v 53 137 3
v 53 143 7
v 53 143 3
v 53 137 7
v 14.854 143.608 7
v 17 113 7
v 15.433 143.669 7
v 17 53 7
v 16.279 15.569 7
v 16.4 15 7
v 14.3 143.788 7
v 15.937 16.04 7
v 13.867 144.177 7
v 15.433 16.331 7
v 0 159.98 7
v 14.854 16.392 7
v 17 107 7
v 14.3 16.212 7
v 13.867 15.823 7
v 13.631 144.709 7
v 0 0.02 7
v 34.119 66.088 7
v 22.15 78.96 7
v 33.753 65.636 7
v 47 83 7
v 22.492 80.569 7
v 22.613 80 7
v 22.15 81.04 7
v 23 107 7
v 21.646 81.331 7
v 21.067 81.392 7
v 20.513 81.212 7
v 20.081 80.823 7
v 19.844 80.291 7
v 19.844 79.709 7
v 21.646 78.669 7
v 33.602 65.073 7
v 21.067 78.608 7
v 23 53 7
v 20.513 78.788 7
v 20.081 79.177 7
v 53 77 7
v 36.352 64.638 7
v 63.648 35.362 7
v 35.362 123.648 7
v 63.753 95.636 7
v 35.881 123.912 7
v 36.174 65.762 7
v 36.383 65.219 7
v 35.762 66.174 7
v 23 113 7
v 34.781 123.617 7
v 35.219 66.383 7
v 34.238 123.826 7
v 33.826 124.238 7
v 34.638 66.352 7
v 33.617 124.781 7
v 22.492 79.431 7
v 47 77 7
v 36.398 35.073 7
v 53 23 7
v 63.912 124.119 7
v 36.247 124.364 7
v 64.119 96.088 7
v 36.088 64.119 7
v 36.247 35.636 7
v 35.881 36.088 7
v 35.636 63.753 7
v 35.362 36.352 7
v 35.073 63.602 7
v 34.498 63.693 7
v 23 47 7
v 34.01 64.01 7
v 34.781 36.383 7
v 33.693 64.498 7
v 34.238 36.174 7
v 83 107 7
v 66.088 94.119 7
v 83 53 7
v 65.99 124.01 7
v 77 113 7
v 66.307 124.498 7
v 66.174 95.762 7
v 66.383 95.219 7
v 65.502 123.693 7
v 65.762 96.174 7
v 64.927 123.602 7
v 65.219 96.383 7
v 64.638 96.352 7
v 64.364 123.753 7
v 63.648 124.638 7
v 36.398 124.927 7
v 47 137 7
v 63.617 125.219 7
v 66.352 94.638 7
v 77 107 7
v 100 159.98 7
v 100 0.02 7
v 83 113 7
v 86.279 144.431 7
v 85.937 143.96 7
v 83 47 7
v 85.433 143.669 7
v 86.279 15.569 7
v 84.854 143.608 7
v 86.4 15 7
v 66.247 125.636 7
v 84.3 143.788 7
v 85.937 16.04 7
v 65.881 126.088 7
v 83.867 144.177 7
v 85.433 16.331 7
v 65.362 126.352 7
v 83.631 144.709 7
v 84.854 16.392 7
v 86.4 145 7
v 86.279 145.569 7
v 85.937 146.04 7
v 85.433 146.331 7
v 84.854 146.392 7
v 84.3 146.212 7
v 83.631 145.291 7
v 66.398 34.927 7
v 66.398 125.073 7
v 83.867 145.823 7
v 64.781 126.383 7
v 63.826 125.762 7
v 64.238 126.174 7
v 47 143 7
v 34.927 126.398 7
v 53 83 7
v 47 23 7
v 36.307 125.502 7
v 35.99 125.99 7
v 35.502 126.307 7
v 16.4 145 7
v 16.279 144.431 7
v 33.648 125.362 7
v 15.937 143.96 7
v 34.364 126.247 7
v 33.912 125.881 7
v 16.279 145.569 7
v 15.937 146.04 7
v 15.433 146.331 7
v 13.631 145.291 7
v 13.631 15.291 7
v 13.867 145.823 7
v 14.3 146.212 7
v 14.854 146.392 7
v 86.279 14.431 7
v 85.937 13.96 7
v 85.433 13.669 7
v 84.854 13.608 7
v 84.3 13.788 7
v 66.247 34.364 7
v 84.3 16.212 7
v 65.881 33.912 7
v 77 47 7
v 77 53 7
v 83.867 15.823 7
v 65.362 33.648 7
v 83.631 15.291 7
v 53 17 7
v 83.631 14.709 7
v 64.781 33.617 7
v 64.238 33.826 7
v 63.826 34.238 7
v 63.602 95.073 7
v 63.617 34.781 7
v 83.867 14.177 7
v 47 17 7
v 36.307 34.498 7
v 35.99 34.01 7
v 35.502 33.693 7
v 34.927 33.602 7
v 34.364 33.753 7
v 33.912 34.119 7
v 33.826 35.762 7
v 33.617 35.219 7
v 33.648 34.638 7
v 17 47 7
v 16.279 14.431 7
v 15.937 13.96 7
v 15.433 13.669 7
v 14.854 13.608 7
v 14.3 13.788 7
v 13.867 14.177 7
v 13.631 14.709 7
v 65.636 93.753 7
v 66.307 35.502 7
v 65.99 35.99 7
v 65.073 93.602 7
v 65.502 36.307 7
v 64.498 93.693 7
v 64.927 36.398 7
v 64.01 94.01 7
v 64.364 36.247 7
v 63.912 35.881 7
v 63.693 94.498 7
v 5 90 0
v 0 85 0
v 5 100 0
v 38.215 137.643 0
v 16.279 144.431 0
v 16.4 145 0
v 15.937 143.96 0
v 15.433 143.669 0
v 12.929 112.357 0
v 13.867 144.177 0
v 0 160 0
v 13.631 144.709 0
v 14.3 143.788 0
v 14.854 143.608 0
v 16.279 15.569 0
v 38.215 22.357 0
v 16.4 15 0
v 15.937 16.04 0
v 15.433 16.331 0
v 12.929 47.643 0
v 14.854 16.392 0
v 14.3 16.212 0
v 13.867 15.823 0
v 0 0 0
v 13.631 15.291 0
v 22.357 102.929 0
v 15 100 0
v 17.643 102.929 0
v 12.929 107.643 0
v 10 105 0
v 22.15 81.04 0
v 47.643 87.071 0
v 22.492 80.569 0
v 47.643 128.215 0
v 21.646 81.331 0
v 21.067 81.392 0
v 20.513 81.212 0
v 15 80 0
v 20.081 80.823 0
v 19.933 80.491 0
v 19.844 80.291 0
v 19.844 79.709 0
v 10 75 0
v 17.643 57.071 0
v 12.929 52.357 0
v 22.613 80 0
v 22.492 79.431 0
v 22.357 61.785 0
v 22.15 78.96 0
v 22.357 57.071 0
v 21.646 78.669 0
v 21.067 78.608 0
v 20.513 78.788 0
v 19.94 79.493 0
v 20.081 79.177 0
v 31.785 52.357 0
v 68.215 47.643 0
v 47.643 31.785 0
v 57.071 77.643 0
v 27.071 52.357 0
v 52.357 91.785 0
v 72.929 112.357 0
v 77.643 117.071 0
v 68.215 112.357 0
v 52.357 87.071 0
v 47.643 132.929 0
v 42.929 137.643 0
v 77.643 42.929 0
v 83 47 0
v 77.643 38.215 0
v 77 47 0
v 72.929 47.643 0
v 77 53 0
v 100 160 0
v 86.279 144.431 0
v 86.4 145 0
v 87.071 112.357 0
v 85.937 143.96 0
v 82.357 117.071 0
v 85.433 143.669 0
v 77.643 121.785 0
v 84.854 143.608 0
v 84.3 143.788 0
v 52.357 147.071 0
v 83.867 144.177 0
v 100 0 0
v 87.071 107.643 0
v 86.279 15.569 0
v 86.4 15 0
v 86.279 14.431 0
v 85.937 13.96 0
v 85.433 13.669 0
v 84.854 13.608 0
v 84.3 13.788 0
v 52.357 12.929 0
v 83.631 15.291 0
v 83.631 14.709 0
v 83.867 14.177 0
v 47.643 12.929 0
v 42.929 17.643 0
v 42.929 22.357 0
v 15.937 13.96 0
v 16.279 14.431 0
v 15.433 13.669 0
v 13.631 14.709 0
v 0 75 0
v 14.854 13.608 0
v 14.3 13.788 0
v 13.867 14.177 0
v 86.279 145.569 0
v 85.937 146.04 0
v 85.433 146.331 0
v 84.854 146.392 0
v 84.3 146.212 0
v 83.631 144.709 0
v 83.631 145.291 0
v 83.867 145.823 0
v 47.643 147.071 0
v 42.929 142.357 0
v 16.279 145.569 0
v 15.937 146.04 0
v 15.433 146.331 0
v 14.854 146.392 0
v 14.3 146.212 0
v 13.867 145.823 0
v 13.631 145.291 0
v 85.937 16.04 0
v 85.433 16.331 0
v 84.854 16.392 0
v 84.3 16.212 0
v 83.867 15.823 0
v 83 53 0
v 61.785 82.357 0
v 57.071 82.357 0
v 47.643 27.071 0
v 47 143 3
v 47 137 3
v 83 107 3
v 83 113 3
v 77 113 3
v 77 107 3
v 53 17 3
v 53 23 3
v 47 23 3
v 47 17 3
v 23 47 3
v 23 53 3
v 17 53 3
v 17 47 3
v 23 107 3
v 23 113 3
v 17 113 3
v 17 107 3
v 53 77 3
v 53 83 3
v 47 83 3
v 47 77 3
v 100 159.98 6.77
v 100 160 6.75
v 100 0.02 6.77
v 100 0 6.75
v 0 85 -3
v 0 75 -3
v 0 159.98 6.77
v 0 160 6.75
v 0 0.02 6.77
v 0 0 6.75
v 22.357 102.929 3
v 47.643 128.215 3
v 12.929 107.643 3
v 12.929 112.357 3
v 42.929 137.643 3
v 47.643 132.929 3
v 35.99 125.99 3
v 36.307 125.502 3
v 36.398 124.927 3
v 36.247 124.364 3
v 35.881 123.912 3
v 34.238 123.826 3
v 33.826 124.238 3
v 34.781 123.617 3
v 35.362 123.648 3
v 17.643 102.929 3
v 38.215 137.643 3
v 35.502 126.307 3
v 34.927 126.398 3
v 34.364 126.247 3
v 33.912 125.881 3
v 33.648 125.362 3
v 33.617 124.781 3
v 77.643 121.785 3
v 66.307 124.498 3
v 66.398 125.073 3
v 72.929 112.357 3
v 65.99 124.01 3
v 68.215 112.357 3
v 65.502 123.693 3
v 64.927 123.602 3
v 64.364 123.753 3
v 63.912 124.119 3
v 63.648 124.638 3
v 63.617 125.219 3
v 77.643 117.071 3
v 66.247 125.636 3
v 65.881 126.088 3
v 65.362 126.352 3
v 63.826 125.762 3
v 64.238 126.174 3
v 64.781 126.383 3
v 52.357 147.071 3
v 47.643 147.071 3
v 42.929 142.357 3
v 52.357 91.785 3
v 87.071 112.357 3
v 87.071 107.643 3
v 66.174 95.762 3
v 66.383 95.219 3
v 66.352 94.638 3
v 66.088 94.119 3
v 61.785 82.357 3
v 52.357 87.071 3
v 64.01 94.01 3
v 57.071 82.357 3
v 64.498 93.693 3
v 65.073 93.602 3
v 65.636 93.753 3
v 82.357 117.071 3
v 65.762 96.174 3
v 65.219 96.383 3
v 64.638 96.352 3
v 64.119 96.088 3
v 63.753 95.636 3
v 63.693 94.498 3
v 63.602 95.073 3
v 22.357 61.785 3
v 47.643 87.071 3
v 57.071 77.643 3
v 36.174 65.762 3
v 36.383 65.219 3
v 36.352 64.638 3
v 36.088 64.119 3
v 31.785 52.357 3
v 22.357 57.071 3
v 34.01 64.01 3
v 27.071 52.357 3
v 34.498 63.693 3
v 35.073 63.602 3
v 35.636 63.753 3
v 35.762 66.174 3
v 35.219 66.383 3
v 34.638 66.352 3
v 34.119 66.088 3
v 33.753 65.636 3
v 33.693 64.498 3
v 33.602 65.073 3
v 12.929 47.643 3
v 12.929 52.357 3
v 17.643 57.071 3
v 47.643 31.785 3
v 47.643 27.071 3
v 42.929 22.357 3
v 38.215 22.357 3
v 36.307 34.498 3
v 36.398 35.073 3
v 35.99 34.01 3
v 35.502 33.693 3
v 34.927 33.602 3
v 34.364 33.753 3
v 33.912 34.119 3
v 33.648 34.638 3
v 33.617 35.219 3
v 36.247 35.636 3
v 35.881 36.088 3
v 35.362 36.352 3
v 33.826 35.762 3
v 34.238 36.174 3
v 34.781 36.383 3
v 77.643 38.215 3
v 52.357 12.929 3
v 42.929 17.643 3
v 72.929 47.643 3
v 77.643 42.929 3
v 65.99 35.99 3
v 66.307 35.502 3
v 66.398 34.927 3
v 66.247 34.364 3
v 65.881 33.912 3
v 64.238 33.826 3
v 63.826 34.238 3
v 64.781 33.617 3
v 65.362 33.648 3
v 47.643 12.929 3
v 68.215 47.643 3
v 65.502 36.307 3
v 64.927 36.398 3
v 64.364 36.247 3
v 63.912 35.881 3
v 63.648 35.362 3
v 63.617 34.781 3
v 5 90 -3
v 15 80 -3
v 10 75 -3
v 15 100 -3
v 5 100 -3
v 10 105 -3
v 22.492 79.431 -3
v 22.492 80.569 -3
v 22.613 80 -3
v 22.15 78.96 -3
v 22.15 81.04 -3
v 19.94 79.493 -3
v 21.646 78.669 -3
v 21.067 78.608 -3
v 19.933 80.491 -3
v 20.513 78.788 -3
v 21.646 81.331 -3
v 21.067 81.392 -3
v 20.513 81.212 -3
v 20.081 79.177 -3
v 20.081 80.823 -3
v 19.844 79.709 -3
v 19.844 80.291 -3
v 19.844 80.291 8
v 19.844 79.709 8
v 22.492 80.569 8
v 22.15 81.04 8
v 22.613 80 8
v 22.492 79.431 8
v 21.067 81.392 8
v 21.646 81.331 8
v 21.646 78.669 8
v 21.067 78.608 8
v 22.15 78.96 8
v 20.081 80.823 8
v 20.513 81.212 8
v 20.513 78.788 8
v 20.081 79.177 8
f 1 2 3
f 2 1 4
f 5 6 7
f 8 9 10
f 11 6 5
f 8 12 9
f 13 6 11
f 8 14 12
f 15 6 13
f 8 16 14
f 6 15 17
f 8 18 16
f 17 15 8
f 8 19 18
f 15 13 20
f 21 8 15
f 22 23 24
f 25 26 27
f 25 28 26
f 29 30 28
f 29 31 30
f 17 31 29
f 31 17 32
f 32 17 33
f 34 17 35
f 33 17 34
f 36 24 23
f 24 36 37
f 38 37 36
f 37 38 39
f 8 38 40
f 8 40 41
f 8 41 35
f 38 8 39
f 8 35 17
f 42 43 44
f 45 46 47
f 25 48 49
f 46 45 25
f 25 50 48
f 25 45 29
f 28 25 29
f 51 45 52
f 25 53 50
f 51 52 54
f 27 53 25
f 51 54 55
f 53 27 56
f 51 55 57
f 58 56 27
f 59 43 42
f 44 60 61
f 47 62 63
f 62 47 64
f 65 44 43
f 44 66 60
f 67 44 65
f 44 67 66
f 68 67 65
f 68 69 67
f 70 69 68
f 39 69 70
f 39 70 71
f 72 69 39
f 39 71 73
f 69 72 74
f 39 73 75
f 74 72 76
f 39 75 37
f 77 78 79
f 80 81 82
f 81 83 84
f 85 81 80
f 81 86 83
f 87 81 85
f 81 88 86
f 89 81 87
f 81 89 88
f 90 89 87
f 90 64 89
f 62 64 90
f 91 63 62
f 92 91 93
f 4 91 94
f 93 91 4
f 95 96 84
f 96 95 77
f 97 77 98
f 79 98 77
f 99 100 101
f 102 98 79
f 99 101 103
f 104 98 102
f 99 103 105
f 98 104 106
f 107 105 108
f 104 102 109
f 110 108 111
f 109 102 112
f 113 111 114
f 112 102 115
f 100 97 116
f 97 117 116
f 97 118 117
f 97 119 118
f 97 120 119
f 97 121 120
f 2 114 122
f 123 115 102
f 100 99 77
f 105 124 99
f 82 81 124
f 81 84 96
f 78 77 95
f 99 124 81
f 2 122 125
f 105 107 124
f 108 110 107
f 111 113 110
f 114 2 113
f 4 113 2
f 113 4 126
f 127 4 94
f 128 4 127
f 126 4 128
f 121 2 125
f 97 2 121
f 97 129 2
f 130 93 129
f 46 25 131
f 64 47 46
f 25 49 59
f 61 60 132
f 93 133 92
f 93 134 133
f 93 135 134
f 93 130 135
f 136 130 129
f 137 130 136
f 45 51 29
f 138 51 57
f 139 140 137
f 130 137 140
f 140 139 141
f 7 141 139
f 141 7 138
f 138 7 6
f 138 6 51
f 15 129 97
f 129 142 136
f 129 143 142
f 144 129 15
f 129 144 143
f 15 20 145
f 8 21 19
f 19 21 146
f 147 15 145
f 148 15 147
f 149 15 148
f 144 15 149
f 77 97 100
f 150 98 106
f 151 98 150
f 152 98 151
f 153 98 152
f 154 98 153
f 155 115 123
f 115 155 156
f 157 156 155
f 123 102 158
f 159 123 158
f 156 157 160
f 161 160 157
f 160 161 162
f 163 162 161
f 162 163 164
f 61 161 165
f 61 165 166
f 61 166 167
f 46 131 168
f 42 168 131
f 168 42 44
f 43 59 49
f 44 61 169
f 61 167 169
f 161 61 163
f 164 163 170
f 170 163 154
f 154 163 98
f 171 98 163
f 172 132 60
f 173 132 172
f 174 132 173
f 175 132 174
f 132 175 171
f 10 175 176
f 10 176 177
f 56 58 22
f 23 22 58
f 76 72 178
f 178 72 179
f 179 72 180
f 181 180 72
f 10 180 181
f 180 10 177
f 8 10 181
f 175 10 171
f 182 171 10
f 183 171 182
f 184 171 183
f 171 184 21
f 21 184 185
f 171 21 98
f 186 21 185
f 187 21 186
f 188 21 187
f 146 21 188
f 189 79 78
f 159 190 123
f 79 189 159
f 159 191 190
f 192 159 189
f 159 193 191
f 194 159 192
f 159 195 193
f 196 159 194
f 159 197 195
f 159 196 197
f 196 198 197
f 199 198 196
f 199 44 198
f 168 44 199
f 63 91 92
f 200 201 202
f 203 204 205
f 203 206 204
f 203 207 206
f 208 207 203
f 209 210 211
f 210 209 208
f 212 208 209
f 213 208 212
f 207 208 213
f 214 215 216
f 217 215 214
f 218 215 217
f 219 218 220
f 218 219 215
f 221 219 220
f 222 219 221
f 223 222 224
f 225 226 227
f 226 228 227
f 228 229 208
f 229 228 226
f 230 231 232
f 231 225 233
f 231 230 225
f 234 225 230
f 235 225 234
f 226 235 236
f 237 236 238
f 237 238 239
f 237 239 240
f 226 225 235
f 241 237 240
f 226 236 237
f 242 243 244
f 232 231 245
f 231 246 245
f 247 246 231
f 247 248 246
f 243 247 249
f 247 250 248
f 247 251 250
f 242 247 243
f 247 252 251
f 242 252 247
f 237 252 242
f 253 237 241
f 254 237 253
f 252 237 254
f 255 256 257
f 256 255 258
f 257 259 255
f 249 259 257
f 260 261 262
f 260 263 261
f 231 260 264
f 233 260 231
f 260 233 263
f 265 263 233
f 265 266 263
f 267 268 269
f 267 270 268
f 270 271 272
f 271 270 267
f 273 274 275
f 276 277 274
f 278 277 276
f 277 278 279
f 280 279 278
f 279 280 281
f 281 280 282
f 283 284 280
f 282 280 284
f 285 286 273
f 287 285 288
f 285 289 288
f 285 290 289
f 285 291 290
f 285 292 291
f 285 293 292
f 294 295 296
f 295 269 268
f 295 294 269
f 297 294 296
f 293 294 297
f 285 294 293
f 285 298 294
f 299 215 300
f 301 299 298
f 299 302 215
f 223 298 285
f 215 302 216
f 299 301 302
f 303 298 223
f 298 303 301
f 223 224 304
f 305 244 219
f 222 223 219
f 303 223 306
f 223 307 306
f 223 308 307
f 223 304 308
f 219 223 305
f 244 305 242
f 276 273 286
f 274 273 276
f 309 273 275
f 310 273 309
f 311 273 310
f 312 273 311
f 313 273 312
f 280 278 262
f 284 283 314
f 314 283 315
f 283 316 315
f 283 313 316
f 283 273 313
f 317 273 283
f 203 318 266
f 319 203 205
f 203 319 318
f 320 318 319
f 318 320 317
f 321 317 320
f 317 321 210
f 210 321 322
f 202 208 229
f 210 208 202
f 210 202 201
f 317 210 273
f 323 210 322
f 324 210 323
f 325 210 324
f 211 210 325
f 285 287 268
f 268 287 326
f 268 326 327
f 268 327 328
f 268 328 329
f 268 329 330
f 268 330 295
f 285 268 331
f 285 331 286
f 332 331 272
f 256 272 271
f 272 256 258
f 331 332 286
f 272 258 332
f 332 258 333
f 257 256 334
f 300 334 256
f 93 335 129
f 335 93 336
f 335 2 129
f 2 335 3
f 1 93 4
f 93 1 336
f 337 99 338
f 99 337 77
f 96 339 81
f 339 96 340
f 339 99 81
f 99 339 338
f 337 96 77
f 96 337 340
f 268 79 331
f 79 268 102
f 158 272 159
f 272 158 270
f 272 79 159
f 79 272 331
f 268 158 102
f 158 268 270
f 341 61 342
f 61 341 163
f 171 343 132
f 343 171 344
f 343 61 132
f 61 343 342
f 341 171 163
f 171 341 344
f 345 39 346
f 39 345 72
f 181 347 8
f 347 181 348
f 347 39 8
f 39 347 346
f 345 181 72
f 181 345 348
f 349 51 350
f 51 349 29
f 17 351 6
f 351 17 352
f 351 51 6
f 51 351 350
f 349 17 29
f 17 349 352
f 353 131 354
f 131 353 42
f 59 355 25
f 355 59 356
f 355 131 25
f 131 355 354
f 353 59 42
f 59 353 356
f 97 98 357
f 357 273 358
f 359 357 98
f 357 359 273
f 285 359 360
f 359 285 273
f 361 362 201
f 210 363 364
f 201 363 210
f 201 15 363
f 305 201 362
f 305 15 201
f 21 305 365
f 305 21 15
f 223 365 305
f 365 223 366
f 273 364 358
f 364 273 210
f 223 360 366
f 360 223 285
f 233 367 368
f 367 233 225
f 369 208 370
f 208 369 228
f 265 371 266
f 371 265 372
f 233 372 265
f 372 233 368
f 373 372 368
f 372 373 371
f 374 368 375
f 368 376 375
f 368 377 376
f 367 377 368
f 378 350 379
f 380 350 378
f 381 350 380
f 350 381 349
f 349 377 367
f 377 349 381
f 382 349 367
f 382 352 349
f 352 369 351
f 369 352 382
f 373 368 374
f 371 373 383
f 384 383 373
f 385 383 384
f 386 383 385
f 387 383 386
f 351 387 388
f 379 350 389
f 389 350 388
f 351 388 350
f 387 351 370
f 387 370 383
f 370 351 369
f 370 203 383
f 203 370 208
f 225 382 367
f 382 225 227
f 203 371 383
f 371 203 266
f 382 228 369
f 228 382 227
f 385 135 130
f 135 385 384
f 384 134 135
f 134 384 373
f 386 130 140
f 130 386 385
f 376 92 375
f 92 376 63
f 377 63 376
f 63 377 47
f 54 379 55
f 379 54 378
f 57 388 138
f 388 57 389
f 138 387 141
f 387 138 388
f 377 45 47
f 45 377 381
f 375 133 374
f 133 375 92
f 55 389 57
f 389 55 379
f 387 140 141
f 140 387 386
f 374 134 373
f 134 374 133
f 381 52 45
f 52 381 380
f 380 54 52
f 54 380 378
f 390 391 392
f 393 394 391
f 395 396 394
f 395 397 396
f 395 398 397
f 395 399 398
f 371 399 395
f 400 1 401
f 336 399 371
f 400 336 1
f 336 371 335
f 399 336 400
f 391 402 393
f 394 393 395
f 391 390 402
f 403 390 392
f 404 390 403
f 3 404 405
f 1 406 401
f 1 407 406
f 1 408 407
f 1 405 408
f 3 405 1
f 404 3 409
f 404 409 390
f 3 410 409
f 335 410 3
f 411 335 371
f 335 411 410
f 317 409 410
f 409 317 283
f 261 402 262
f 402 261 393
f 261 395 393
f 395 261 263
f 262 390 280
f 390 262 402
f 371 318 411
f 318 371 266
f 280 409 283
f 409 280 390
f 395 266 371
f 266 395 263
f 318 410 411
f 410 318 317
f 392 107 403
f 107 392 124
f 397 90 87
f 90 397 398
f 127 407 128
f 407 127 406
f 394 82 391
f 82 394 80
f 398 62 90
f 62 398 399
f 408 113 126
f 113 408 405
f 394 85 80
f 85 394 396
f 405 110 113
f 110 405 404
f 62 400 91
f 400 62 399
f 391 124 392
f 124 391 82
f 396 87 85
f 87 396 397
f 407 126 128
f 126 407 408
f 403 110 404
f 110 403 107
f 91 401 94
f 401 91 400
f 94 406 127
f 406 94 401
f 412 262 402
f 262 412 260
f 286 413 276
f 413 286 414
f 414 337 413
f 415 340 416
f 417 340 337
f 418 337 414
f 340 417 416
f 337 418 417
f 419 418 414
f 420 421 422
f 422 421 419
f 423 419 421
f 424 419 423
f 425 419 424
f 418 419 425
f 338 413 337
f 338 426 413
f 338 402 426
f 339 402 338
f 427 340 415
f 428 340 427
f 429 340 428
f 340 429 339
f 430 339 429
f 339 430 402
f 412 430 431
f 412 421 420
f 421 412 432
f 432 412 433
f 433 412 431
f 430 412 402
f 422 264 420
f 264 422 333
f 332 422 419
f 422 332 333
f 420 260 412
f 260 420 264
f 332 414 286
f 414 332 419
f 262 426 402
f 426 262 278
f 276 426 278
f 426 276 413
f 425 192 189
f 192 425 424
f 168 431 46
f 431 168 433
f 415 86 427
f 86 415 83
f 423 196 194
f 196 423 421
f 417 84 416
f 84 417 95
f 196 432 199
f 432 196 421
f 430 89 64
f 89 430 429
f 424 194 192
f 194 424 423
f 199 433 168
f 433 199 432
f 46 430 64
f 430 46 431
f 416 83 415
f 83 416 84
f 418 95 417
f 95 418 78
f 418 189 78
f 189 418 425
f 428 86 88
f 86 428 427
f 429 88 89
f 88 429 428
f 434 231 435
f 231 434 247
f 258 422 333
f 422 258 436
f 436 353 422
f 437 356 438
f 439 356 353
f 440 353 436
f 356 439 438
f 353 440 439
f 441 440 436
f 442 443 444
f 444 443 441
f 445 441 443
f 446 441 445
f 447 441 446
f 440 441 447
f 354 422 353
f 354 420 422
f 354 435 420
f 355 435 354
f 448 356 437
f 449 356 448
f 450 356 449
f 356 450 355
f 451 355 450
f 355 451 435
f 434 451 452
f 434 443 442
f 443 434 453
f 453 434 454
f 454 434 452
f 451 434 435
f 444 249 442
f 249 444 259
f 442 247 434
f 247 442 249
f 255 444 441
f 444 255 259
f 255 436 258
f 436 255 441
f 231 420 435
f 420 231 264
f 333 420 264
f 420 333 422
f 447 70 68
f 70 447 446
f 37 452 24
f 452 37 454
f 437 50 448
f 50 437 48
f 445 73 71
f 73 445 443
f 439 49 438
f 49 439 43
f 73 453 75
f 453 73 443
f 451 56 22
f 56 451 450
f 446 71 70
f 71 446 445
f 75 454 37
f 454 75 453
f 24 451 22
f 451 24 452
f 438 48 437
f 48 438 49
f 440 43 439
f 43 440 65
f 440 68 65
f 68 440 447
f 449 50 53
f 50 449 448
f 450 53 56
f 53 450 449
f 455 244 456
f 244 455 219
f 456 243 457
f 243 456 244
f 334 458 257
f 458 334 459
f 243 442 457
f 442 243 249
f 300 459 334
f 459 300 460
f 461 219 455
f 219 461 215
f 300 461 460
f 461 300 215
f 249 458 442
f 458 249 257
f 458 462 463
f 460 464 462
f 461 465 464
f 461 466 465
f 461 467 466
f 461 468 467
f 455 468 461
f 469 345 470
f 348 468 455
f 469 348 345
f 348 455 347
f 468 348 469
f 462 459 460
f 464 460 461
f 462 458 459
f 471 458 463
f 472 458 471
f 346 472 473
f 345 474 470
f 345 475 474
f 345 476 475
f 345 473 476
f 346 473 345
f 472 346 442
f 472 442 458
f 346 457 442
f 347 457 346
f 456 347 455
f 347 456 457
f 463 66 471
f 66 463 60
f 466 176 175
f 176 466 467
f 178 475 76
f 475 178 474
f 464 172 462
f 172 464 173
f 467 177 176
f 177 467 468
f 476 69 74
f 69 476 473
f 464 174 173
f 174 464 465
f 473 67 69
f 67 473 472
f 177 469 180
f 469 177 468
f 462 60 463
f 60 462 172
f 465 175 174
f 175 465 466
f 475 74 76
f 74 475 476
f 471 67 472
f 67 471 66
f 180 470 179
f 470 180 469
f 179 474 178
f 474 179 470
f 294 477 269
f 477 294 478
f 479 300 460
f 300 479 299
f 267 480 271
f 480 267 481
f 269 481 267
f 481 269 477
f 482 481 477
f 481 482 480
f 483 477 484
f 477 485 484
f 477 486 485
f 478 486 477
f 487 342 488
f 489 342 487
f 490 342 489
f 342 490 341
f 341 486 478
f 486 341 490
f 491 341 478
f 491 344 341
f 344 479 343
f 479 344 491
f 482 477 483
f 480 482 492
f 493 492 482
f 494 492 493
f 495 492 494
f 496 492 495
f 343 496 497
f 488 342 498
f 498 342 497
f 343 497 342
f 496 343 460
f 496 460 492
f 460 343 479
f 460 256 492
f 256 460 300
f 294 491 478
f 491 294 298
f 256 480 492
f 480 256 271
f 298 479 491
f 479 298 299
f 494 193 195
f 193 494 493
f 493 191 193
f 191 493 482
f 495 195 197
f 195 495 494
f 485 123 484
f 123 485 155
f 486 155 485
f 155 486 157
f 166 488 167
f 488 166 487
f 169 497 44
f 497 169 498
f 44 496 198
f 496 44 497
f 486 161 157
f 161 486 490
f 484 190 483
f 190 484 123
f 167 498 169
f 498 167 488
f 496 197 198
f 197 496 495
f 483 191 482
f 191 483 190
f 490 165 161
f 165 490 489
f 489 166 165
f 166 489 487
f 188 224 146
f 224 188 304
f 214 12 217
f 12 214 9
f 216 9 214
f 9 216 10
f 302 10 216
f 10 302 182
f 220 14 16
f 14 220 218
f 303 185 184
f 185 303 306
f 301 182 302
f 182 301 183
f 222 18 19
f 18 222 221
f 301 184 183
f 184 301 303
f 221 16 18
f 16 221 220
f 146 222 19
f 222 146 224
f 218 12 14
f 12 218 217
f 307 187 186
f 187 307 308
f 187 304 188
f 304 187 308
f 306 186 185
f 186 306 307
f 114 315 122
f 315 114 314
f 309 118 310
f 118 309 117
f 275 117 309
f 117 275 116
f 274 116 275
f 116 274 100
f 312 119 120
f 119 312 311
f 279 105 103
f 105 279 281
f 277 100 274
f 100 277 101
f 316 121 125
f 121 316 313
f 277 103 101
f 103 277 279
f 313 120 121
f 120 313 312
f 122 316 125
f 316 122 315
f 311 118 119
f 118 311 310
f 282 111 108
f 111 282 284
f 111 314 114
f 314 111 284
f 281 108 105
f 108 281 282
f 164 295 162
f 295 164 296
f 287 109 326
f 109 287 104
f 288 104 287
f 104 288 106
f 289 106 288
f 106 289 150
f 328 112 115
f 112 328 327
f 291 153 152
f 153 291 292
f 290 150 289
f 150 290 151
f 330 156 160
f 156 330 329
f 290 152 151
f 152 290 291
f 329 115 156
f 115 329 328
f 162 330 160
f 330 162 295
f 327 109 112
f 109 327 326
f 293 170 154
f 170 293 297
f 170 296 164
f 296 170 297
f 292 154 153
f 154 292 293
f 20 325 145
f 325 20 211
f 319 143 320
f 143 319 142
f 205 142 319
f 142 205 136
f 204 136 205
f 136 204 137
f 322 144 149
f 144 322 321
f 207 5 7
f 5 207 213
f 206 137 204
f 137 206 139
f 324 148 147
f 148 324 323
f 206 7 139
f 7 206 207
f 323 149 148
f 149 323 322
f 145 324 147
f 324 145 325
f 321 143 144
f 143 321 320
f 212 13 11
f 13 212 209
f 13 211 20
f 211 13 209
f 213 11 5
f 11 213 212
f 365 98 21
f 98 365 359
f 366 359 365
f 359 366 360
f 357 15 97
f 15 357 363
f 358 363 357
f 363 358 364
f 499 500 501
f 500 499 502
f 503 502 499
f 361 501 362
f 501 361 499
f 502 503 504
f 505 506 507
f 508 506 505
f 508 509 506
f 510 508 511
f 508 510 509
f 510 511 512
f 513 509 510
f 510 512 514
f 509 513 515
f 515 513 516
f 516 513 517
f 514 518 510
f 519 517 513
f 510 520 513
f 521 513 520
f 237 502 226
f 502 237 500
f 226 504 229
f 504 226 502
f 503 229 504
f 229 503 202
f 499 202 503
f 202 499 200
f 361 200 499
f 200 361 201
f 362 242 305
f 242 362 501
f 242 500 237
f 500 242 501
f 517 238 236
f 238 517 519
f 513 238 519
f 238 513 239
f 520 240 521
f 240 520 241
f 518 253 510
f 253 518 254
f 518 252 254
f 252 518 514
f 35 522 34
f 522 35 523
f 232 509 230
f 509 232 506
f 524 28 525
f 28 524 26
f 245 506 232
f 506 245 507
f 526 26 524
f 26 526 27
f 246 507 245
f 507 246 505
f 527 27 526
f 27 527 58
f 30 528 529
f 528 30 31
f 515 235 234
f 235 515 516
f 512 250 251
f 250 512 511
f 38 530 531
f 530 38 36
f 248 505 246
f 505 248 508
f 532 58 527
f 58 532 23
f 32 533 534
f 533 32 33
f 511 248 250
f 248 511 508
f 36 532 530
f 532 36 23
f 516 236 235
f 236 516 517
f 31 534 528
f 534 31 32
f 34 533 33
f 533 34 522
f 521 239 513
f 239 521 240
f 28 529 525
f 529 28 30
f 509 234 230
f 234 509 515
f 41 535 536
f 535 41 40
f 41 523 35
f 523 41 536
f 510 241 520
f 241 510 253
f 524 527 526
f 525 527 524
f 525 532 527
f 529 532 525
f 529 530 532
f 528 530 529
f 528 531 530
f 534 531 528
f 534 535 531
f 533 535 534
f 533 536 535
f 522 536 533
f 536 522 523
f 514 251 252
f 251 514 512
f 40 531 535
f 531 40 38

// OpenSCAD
$fn=15;
panel_Height=160;

// Derived Variables
grid = panel_Height / 16;
panel_Width=grid*10;


//Led spacing parameters
led_side_width=6;
led_package_depth=4;

//Chamber Parameters
circle_diameter=grid*1.65;
midpoint_spacing=grid*1.65;
chamber_depth=4;

//Top Diffuser Parameters
diffuse_depth=0.75;


//ETC
screw_diameter=2.8;
screw_distance=1.5*grid;

bridging_helper_size=0.2;
bridging_padding = 1;

chanfer = 5;

pcb_depth = 3;

led_depth = led_package_depth + pcb_depth;

//Show/hide elements
led_layer = true;
chamber = false;
bridge_helpers = false;
diffuse_layer = false;

pcb_mode = false;

if (pcb_mode){
    led_layer = false;
    chamber = false;
    bridge_helpers = false;
    diffuse_layer = false;
    pcb_depth = 0;
    
    pcb_link([0,0,0], 0, true);
}



//Define major points
a = [5 * grid, 14 * grid, 0];
b = [8 * grid, 11 * grid, 0];
c = [8 * grid, 5 * grid, 0];
d = [5 * grid, 2 * grid, 0];
e = [2 * grid, 5 * grid, 0];
f = [2 * grid, 11 * grid, 0];
g = [5 * grid, 8 * grid, 0];
//h = [1 * grid, 1 * grid, 0];

points = [a, b, c, d, e, f, g];

render() difference(){
    union(){
        //Led Layer
        if (led_layer) difference() {
            cube([panel_Width, panel_Height, led_depth]);
            for(i=points)
            {
                translate(i - [led_side_width/2, led_side_width/2, 0])
                    cube([led_side_width, led_side_width, led_depth], false);
            }
        }
        
        
        //Chamber Layer
        if(chamber){
            translate([0, 0, led_depth]){
                difference() {
                    cube([panel_Width, panel_Height, chamber_depth]);
                    
                    //Horizontal
                    for(i=[a, d, g]) { chamber(i, 0); }
                    
                    //Vertical
                    for(i=[b, c, e, f]) { chamber(i, 90); }
                }
            }
        }
        
        //Diffuse Layer
        if(diffuse_layer){
            translate([0,0,led_depth + chamber_depth]){
                cube([panel_Width, panel_Height, diffuse_depth]);
            }
        }
    }

    //Corner Screw Holes
    screw([screw_distance, screw_distance, 0]);
    screw([panel_Width - screw_distance, panel_Height - screw_distance,0]);
    screw([panel_Width - screw_distance,screw_distance,0]);
    screw([screw_distance,panel_Height - screw_distance,0]);

    side_chanfer([0,0,0], 0);
    side_chanfer([panel_Width, panel_Height-chanfer-chanfer, 0], 180);

    //PCB Slots
    if (!pcb_mode){
        pcb_link(f, 45);
        pcb_link(a, -45);
        pcb_link(b, 225);
        pcb_link(g, 225);
        pcb_link(e, -45);
        pcb_link(d, 45);

        //pcb_link(f + [10,10,0], -45);
    }
}

pcb_edge_right([0*grid, 8*grid, -pcb_depth]);
//pcb_edge_left([0,0,0]);

module pcb_link(position, zAngle, profile=false){
    if(!profile) { union(){
        linear_extrude(pcb_depth) pcb_profile(position, zAngle);
        translate(position) rotate([0,0,zAngle])screw([distance_formula(a,b)/2, 0, 0]);
    }}
    else { pcb_profile(position, zAngle); }
}

module pcb_edge_left(position, zAngle=0, profile=false){
    if(!profile) { union(){
        linear_extrude(pcb_depth) pcb_profile_left(position, zAngle);
        translate(position) rotate([0,0,zAngle])screw([distance_formula(a,b)/2, 0, 0]);
    }}
    else { pcb_profile_left(position, zAngle); }
}

module pcb_edge_right(position, zAngle=0, profile=false){
    if(!profile) { union(){
        translate(position) linear_extrude(pcb_depth) pcb_profile_right([0,0,0], zAngle);
        translate(position) rotate([0,0,zAngle])screw([distance_formula(a,b)/2, 0, 0]);
    }}
    else { pcb_profile_right(position, zAngle); }
}

module pcb_profile(position, zAngle){
    pcb_grid = grid/3;
    distance = distance_formula(a,b) - (2*pcb_grid);
    translate(position) rotate([0,0,zAngle + 180]) difference(){
        polygon(points=[
            [2*pcb_grid, 1*pcb_grid],
            [1*pcb_grid, 2*pcb_grid],
            [-distance + 1*pcb_grid, 2*pcb_grid],
            [-distance, 1*pcb_grid],
            [-distance, -1*pcb_grid],
            [-distance + 1*pcb_grid, -2*pcb_grid],
            [1*pcb_grid, -2*pcb_grid],
            [2*pcb_grid, -1*pcb_grid]
        ]);
        if(pcb_mode){ translate([distance_formula(a,b)/2, 0, 0]) circle(screw_diameter/2); }
    }
}

module pcb_profile_left(position, zAngle){
    pcb_grid = pcb_width/2;
    translate(position) rotate([0,0,zAngle]) difference(){
        hull(){
            translate([distance_formula(a,b), 0, 0]) rotate([0,0,-90]) translate([0,-3*pcb_grid,0]) polygon(points=[[-pcb_grid * 2,0], [-pcb_grid, pcb_grid], [pcb_grid, pcb_grid], [pcb_grid * 2,0]]);
            translate([0,0,0]) rotate([0,0,90]) translate([0,1*pcb_grid,0]) polygon(points=[[-pcb_grid * 2,0], [-pcb_grid, pcb_grid], [pcb_grid, pcb_grid], [pcb_grid * 2,0]]);
        } 
        translate([distance_formula(a,b)/2, 0, 0]) circle(screw_diameter/2);
    }
}

module pcb_profile_right(position, zAngle){
    pcb_grid = grid/2;
    translate(position) rotate([0,0,zAngle]) {
        translate([0,0,0]) rotate([0,0,0]) polygon(points=[
            [0,pcb_grid],
            [pcb_grid, 2*pcb_grid],
            [pcb_grid, 4*pcb_grid],
            [2*pcb_grid, 5*pcb_grid],
            [3*pcb_grid, 4*pcb_grid],
            [3*pcb_grid, 0],
            [2*pcb_grid, -pcb_grid],
            [0,-pcb_grid]
            ]);
        translate([distance_formula(a,b)/2, 0, 0]) circle(screw_diameter/2);
    }
}

module side_chanfer(position, rotation) {
    total_height = led_depth+chamber_depth+diffuse_depth;
    translate(position + [0,chanfer,total_height - chanfer]) rotate([90,0,90+rotation]) { linear_extrude(height=panel_Width)
        difference(){
            polygon(points=[[-chanfer,chanfer], [-chanfer,0],[0,chanfer]]);
            sector(chanfer, [90,180]);
        }

    }
}

module screw(position, length=(led_depth+chamber_depth)){
    translate(position) cylinder(length, screw_diameter/2, screw_diameter/2, false);
}

module chamber(position, zAngle){
    translate(position){
        rotate([0,0,zAngle]){
            difference(){
                hull(){
                    translate([-midpoint_spacing,0,0]) cylinder(chamber_depth, circle_diameter/2, circle_diameter/2);
                    translate([midpoint_spacing,0,0]) cylinder(chamber_depth, circle_diameter/2, circle_diameter/2);
                }
                if(bridge_helpers){
                    translate([0,0,bridging_helper_size/2]) cube([led_side_width+bridging_padding, circle_diameter, bridging_helper_size], true);
                }
            }
        }
    }
}

// Pillaged from here: https://openhome.cc/eGossip/OpenSCAD/SectorArc.html
module sector(radius, angles) {
    r = radius / cos(180 / $fn);
    step = -360 / $fn;

    points = concat([[0, 0]],
        [for(a = [angles[0] : step : angles[1] - 360]) 
            [r * cos(a), r * sin(a)]
        ],
        [[r * cos(angles[1]), r * sin(angles[1])]]
    );

    difference() {
        circle(radius, $fn = $fn + 20);
        polygon(points);
    }
}

function distance_formula(a,b) = sqrt( (b[0] - a[0])^2 + (b[1] - a[1])^2 );
